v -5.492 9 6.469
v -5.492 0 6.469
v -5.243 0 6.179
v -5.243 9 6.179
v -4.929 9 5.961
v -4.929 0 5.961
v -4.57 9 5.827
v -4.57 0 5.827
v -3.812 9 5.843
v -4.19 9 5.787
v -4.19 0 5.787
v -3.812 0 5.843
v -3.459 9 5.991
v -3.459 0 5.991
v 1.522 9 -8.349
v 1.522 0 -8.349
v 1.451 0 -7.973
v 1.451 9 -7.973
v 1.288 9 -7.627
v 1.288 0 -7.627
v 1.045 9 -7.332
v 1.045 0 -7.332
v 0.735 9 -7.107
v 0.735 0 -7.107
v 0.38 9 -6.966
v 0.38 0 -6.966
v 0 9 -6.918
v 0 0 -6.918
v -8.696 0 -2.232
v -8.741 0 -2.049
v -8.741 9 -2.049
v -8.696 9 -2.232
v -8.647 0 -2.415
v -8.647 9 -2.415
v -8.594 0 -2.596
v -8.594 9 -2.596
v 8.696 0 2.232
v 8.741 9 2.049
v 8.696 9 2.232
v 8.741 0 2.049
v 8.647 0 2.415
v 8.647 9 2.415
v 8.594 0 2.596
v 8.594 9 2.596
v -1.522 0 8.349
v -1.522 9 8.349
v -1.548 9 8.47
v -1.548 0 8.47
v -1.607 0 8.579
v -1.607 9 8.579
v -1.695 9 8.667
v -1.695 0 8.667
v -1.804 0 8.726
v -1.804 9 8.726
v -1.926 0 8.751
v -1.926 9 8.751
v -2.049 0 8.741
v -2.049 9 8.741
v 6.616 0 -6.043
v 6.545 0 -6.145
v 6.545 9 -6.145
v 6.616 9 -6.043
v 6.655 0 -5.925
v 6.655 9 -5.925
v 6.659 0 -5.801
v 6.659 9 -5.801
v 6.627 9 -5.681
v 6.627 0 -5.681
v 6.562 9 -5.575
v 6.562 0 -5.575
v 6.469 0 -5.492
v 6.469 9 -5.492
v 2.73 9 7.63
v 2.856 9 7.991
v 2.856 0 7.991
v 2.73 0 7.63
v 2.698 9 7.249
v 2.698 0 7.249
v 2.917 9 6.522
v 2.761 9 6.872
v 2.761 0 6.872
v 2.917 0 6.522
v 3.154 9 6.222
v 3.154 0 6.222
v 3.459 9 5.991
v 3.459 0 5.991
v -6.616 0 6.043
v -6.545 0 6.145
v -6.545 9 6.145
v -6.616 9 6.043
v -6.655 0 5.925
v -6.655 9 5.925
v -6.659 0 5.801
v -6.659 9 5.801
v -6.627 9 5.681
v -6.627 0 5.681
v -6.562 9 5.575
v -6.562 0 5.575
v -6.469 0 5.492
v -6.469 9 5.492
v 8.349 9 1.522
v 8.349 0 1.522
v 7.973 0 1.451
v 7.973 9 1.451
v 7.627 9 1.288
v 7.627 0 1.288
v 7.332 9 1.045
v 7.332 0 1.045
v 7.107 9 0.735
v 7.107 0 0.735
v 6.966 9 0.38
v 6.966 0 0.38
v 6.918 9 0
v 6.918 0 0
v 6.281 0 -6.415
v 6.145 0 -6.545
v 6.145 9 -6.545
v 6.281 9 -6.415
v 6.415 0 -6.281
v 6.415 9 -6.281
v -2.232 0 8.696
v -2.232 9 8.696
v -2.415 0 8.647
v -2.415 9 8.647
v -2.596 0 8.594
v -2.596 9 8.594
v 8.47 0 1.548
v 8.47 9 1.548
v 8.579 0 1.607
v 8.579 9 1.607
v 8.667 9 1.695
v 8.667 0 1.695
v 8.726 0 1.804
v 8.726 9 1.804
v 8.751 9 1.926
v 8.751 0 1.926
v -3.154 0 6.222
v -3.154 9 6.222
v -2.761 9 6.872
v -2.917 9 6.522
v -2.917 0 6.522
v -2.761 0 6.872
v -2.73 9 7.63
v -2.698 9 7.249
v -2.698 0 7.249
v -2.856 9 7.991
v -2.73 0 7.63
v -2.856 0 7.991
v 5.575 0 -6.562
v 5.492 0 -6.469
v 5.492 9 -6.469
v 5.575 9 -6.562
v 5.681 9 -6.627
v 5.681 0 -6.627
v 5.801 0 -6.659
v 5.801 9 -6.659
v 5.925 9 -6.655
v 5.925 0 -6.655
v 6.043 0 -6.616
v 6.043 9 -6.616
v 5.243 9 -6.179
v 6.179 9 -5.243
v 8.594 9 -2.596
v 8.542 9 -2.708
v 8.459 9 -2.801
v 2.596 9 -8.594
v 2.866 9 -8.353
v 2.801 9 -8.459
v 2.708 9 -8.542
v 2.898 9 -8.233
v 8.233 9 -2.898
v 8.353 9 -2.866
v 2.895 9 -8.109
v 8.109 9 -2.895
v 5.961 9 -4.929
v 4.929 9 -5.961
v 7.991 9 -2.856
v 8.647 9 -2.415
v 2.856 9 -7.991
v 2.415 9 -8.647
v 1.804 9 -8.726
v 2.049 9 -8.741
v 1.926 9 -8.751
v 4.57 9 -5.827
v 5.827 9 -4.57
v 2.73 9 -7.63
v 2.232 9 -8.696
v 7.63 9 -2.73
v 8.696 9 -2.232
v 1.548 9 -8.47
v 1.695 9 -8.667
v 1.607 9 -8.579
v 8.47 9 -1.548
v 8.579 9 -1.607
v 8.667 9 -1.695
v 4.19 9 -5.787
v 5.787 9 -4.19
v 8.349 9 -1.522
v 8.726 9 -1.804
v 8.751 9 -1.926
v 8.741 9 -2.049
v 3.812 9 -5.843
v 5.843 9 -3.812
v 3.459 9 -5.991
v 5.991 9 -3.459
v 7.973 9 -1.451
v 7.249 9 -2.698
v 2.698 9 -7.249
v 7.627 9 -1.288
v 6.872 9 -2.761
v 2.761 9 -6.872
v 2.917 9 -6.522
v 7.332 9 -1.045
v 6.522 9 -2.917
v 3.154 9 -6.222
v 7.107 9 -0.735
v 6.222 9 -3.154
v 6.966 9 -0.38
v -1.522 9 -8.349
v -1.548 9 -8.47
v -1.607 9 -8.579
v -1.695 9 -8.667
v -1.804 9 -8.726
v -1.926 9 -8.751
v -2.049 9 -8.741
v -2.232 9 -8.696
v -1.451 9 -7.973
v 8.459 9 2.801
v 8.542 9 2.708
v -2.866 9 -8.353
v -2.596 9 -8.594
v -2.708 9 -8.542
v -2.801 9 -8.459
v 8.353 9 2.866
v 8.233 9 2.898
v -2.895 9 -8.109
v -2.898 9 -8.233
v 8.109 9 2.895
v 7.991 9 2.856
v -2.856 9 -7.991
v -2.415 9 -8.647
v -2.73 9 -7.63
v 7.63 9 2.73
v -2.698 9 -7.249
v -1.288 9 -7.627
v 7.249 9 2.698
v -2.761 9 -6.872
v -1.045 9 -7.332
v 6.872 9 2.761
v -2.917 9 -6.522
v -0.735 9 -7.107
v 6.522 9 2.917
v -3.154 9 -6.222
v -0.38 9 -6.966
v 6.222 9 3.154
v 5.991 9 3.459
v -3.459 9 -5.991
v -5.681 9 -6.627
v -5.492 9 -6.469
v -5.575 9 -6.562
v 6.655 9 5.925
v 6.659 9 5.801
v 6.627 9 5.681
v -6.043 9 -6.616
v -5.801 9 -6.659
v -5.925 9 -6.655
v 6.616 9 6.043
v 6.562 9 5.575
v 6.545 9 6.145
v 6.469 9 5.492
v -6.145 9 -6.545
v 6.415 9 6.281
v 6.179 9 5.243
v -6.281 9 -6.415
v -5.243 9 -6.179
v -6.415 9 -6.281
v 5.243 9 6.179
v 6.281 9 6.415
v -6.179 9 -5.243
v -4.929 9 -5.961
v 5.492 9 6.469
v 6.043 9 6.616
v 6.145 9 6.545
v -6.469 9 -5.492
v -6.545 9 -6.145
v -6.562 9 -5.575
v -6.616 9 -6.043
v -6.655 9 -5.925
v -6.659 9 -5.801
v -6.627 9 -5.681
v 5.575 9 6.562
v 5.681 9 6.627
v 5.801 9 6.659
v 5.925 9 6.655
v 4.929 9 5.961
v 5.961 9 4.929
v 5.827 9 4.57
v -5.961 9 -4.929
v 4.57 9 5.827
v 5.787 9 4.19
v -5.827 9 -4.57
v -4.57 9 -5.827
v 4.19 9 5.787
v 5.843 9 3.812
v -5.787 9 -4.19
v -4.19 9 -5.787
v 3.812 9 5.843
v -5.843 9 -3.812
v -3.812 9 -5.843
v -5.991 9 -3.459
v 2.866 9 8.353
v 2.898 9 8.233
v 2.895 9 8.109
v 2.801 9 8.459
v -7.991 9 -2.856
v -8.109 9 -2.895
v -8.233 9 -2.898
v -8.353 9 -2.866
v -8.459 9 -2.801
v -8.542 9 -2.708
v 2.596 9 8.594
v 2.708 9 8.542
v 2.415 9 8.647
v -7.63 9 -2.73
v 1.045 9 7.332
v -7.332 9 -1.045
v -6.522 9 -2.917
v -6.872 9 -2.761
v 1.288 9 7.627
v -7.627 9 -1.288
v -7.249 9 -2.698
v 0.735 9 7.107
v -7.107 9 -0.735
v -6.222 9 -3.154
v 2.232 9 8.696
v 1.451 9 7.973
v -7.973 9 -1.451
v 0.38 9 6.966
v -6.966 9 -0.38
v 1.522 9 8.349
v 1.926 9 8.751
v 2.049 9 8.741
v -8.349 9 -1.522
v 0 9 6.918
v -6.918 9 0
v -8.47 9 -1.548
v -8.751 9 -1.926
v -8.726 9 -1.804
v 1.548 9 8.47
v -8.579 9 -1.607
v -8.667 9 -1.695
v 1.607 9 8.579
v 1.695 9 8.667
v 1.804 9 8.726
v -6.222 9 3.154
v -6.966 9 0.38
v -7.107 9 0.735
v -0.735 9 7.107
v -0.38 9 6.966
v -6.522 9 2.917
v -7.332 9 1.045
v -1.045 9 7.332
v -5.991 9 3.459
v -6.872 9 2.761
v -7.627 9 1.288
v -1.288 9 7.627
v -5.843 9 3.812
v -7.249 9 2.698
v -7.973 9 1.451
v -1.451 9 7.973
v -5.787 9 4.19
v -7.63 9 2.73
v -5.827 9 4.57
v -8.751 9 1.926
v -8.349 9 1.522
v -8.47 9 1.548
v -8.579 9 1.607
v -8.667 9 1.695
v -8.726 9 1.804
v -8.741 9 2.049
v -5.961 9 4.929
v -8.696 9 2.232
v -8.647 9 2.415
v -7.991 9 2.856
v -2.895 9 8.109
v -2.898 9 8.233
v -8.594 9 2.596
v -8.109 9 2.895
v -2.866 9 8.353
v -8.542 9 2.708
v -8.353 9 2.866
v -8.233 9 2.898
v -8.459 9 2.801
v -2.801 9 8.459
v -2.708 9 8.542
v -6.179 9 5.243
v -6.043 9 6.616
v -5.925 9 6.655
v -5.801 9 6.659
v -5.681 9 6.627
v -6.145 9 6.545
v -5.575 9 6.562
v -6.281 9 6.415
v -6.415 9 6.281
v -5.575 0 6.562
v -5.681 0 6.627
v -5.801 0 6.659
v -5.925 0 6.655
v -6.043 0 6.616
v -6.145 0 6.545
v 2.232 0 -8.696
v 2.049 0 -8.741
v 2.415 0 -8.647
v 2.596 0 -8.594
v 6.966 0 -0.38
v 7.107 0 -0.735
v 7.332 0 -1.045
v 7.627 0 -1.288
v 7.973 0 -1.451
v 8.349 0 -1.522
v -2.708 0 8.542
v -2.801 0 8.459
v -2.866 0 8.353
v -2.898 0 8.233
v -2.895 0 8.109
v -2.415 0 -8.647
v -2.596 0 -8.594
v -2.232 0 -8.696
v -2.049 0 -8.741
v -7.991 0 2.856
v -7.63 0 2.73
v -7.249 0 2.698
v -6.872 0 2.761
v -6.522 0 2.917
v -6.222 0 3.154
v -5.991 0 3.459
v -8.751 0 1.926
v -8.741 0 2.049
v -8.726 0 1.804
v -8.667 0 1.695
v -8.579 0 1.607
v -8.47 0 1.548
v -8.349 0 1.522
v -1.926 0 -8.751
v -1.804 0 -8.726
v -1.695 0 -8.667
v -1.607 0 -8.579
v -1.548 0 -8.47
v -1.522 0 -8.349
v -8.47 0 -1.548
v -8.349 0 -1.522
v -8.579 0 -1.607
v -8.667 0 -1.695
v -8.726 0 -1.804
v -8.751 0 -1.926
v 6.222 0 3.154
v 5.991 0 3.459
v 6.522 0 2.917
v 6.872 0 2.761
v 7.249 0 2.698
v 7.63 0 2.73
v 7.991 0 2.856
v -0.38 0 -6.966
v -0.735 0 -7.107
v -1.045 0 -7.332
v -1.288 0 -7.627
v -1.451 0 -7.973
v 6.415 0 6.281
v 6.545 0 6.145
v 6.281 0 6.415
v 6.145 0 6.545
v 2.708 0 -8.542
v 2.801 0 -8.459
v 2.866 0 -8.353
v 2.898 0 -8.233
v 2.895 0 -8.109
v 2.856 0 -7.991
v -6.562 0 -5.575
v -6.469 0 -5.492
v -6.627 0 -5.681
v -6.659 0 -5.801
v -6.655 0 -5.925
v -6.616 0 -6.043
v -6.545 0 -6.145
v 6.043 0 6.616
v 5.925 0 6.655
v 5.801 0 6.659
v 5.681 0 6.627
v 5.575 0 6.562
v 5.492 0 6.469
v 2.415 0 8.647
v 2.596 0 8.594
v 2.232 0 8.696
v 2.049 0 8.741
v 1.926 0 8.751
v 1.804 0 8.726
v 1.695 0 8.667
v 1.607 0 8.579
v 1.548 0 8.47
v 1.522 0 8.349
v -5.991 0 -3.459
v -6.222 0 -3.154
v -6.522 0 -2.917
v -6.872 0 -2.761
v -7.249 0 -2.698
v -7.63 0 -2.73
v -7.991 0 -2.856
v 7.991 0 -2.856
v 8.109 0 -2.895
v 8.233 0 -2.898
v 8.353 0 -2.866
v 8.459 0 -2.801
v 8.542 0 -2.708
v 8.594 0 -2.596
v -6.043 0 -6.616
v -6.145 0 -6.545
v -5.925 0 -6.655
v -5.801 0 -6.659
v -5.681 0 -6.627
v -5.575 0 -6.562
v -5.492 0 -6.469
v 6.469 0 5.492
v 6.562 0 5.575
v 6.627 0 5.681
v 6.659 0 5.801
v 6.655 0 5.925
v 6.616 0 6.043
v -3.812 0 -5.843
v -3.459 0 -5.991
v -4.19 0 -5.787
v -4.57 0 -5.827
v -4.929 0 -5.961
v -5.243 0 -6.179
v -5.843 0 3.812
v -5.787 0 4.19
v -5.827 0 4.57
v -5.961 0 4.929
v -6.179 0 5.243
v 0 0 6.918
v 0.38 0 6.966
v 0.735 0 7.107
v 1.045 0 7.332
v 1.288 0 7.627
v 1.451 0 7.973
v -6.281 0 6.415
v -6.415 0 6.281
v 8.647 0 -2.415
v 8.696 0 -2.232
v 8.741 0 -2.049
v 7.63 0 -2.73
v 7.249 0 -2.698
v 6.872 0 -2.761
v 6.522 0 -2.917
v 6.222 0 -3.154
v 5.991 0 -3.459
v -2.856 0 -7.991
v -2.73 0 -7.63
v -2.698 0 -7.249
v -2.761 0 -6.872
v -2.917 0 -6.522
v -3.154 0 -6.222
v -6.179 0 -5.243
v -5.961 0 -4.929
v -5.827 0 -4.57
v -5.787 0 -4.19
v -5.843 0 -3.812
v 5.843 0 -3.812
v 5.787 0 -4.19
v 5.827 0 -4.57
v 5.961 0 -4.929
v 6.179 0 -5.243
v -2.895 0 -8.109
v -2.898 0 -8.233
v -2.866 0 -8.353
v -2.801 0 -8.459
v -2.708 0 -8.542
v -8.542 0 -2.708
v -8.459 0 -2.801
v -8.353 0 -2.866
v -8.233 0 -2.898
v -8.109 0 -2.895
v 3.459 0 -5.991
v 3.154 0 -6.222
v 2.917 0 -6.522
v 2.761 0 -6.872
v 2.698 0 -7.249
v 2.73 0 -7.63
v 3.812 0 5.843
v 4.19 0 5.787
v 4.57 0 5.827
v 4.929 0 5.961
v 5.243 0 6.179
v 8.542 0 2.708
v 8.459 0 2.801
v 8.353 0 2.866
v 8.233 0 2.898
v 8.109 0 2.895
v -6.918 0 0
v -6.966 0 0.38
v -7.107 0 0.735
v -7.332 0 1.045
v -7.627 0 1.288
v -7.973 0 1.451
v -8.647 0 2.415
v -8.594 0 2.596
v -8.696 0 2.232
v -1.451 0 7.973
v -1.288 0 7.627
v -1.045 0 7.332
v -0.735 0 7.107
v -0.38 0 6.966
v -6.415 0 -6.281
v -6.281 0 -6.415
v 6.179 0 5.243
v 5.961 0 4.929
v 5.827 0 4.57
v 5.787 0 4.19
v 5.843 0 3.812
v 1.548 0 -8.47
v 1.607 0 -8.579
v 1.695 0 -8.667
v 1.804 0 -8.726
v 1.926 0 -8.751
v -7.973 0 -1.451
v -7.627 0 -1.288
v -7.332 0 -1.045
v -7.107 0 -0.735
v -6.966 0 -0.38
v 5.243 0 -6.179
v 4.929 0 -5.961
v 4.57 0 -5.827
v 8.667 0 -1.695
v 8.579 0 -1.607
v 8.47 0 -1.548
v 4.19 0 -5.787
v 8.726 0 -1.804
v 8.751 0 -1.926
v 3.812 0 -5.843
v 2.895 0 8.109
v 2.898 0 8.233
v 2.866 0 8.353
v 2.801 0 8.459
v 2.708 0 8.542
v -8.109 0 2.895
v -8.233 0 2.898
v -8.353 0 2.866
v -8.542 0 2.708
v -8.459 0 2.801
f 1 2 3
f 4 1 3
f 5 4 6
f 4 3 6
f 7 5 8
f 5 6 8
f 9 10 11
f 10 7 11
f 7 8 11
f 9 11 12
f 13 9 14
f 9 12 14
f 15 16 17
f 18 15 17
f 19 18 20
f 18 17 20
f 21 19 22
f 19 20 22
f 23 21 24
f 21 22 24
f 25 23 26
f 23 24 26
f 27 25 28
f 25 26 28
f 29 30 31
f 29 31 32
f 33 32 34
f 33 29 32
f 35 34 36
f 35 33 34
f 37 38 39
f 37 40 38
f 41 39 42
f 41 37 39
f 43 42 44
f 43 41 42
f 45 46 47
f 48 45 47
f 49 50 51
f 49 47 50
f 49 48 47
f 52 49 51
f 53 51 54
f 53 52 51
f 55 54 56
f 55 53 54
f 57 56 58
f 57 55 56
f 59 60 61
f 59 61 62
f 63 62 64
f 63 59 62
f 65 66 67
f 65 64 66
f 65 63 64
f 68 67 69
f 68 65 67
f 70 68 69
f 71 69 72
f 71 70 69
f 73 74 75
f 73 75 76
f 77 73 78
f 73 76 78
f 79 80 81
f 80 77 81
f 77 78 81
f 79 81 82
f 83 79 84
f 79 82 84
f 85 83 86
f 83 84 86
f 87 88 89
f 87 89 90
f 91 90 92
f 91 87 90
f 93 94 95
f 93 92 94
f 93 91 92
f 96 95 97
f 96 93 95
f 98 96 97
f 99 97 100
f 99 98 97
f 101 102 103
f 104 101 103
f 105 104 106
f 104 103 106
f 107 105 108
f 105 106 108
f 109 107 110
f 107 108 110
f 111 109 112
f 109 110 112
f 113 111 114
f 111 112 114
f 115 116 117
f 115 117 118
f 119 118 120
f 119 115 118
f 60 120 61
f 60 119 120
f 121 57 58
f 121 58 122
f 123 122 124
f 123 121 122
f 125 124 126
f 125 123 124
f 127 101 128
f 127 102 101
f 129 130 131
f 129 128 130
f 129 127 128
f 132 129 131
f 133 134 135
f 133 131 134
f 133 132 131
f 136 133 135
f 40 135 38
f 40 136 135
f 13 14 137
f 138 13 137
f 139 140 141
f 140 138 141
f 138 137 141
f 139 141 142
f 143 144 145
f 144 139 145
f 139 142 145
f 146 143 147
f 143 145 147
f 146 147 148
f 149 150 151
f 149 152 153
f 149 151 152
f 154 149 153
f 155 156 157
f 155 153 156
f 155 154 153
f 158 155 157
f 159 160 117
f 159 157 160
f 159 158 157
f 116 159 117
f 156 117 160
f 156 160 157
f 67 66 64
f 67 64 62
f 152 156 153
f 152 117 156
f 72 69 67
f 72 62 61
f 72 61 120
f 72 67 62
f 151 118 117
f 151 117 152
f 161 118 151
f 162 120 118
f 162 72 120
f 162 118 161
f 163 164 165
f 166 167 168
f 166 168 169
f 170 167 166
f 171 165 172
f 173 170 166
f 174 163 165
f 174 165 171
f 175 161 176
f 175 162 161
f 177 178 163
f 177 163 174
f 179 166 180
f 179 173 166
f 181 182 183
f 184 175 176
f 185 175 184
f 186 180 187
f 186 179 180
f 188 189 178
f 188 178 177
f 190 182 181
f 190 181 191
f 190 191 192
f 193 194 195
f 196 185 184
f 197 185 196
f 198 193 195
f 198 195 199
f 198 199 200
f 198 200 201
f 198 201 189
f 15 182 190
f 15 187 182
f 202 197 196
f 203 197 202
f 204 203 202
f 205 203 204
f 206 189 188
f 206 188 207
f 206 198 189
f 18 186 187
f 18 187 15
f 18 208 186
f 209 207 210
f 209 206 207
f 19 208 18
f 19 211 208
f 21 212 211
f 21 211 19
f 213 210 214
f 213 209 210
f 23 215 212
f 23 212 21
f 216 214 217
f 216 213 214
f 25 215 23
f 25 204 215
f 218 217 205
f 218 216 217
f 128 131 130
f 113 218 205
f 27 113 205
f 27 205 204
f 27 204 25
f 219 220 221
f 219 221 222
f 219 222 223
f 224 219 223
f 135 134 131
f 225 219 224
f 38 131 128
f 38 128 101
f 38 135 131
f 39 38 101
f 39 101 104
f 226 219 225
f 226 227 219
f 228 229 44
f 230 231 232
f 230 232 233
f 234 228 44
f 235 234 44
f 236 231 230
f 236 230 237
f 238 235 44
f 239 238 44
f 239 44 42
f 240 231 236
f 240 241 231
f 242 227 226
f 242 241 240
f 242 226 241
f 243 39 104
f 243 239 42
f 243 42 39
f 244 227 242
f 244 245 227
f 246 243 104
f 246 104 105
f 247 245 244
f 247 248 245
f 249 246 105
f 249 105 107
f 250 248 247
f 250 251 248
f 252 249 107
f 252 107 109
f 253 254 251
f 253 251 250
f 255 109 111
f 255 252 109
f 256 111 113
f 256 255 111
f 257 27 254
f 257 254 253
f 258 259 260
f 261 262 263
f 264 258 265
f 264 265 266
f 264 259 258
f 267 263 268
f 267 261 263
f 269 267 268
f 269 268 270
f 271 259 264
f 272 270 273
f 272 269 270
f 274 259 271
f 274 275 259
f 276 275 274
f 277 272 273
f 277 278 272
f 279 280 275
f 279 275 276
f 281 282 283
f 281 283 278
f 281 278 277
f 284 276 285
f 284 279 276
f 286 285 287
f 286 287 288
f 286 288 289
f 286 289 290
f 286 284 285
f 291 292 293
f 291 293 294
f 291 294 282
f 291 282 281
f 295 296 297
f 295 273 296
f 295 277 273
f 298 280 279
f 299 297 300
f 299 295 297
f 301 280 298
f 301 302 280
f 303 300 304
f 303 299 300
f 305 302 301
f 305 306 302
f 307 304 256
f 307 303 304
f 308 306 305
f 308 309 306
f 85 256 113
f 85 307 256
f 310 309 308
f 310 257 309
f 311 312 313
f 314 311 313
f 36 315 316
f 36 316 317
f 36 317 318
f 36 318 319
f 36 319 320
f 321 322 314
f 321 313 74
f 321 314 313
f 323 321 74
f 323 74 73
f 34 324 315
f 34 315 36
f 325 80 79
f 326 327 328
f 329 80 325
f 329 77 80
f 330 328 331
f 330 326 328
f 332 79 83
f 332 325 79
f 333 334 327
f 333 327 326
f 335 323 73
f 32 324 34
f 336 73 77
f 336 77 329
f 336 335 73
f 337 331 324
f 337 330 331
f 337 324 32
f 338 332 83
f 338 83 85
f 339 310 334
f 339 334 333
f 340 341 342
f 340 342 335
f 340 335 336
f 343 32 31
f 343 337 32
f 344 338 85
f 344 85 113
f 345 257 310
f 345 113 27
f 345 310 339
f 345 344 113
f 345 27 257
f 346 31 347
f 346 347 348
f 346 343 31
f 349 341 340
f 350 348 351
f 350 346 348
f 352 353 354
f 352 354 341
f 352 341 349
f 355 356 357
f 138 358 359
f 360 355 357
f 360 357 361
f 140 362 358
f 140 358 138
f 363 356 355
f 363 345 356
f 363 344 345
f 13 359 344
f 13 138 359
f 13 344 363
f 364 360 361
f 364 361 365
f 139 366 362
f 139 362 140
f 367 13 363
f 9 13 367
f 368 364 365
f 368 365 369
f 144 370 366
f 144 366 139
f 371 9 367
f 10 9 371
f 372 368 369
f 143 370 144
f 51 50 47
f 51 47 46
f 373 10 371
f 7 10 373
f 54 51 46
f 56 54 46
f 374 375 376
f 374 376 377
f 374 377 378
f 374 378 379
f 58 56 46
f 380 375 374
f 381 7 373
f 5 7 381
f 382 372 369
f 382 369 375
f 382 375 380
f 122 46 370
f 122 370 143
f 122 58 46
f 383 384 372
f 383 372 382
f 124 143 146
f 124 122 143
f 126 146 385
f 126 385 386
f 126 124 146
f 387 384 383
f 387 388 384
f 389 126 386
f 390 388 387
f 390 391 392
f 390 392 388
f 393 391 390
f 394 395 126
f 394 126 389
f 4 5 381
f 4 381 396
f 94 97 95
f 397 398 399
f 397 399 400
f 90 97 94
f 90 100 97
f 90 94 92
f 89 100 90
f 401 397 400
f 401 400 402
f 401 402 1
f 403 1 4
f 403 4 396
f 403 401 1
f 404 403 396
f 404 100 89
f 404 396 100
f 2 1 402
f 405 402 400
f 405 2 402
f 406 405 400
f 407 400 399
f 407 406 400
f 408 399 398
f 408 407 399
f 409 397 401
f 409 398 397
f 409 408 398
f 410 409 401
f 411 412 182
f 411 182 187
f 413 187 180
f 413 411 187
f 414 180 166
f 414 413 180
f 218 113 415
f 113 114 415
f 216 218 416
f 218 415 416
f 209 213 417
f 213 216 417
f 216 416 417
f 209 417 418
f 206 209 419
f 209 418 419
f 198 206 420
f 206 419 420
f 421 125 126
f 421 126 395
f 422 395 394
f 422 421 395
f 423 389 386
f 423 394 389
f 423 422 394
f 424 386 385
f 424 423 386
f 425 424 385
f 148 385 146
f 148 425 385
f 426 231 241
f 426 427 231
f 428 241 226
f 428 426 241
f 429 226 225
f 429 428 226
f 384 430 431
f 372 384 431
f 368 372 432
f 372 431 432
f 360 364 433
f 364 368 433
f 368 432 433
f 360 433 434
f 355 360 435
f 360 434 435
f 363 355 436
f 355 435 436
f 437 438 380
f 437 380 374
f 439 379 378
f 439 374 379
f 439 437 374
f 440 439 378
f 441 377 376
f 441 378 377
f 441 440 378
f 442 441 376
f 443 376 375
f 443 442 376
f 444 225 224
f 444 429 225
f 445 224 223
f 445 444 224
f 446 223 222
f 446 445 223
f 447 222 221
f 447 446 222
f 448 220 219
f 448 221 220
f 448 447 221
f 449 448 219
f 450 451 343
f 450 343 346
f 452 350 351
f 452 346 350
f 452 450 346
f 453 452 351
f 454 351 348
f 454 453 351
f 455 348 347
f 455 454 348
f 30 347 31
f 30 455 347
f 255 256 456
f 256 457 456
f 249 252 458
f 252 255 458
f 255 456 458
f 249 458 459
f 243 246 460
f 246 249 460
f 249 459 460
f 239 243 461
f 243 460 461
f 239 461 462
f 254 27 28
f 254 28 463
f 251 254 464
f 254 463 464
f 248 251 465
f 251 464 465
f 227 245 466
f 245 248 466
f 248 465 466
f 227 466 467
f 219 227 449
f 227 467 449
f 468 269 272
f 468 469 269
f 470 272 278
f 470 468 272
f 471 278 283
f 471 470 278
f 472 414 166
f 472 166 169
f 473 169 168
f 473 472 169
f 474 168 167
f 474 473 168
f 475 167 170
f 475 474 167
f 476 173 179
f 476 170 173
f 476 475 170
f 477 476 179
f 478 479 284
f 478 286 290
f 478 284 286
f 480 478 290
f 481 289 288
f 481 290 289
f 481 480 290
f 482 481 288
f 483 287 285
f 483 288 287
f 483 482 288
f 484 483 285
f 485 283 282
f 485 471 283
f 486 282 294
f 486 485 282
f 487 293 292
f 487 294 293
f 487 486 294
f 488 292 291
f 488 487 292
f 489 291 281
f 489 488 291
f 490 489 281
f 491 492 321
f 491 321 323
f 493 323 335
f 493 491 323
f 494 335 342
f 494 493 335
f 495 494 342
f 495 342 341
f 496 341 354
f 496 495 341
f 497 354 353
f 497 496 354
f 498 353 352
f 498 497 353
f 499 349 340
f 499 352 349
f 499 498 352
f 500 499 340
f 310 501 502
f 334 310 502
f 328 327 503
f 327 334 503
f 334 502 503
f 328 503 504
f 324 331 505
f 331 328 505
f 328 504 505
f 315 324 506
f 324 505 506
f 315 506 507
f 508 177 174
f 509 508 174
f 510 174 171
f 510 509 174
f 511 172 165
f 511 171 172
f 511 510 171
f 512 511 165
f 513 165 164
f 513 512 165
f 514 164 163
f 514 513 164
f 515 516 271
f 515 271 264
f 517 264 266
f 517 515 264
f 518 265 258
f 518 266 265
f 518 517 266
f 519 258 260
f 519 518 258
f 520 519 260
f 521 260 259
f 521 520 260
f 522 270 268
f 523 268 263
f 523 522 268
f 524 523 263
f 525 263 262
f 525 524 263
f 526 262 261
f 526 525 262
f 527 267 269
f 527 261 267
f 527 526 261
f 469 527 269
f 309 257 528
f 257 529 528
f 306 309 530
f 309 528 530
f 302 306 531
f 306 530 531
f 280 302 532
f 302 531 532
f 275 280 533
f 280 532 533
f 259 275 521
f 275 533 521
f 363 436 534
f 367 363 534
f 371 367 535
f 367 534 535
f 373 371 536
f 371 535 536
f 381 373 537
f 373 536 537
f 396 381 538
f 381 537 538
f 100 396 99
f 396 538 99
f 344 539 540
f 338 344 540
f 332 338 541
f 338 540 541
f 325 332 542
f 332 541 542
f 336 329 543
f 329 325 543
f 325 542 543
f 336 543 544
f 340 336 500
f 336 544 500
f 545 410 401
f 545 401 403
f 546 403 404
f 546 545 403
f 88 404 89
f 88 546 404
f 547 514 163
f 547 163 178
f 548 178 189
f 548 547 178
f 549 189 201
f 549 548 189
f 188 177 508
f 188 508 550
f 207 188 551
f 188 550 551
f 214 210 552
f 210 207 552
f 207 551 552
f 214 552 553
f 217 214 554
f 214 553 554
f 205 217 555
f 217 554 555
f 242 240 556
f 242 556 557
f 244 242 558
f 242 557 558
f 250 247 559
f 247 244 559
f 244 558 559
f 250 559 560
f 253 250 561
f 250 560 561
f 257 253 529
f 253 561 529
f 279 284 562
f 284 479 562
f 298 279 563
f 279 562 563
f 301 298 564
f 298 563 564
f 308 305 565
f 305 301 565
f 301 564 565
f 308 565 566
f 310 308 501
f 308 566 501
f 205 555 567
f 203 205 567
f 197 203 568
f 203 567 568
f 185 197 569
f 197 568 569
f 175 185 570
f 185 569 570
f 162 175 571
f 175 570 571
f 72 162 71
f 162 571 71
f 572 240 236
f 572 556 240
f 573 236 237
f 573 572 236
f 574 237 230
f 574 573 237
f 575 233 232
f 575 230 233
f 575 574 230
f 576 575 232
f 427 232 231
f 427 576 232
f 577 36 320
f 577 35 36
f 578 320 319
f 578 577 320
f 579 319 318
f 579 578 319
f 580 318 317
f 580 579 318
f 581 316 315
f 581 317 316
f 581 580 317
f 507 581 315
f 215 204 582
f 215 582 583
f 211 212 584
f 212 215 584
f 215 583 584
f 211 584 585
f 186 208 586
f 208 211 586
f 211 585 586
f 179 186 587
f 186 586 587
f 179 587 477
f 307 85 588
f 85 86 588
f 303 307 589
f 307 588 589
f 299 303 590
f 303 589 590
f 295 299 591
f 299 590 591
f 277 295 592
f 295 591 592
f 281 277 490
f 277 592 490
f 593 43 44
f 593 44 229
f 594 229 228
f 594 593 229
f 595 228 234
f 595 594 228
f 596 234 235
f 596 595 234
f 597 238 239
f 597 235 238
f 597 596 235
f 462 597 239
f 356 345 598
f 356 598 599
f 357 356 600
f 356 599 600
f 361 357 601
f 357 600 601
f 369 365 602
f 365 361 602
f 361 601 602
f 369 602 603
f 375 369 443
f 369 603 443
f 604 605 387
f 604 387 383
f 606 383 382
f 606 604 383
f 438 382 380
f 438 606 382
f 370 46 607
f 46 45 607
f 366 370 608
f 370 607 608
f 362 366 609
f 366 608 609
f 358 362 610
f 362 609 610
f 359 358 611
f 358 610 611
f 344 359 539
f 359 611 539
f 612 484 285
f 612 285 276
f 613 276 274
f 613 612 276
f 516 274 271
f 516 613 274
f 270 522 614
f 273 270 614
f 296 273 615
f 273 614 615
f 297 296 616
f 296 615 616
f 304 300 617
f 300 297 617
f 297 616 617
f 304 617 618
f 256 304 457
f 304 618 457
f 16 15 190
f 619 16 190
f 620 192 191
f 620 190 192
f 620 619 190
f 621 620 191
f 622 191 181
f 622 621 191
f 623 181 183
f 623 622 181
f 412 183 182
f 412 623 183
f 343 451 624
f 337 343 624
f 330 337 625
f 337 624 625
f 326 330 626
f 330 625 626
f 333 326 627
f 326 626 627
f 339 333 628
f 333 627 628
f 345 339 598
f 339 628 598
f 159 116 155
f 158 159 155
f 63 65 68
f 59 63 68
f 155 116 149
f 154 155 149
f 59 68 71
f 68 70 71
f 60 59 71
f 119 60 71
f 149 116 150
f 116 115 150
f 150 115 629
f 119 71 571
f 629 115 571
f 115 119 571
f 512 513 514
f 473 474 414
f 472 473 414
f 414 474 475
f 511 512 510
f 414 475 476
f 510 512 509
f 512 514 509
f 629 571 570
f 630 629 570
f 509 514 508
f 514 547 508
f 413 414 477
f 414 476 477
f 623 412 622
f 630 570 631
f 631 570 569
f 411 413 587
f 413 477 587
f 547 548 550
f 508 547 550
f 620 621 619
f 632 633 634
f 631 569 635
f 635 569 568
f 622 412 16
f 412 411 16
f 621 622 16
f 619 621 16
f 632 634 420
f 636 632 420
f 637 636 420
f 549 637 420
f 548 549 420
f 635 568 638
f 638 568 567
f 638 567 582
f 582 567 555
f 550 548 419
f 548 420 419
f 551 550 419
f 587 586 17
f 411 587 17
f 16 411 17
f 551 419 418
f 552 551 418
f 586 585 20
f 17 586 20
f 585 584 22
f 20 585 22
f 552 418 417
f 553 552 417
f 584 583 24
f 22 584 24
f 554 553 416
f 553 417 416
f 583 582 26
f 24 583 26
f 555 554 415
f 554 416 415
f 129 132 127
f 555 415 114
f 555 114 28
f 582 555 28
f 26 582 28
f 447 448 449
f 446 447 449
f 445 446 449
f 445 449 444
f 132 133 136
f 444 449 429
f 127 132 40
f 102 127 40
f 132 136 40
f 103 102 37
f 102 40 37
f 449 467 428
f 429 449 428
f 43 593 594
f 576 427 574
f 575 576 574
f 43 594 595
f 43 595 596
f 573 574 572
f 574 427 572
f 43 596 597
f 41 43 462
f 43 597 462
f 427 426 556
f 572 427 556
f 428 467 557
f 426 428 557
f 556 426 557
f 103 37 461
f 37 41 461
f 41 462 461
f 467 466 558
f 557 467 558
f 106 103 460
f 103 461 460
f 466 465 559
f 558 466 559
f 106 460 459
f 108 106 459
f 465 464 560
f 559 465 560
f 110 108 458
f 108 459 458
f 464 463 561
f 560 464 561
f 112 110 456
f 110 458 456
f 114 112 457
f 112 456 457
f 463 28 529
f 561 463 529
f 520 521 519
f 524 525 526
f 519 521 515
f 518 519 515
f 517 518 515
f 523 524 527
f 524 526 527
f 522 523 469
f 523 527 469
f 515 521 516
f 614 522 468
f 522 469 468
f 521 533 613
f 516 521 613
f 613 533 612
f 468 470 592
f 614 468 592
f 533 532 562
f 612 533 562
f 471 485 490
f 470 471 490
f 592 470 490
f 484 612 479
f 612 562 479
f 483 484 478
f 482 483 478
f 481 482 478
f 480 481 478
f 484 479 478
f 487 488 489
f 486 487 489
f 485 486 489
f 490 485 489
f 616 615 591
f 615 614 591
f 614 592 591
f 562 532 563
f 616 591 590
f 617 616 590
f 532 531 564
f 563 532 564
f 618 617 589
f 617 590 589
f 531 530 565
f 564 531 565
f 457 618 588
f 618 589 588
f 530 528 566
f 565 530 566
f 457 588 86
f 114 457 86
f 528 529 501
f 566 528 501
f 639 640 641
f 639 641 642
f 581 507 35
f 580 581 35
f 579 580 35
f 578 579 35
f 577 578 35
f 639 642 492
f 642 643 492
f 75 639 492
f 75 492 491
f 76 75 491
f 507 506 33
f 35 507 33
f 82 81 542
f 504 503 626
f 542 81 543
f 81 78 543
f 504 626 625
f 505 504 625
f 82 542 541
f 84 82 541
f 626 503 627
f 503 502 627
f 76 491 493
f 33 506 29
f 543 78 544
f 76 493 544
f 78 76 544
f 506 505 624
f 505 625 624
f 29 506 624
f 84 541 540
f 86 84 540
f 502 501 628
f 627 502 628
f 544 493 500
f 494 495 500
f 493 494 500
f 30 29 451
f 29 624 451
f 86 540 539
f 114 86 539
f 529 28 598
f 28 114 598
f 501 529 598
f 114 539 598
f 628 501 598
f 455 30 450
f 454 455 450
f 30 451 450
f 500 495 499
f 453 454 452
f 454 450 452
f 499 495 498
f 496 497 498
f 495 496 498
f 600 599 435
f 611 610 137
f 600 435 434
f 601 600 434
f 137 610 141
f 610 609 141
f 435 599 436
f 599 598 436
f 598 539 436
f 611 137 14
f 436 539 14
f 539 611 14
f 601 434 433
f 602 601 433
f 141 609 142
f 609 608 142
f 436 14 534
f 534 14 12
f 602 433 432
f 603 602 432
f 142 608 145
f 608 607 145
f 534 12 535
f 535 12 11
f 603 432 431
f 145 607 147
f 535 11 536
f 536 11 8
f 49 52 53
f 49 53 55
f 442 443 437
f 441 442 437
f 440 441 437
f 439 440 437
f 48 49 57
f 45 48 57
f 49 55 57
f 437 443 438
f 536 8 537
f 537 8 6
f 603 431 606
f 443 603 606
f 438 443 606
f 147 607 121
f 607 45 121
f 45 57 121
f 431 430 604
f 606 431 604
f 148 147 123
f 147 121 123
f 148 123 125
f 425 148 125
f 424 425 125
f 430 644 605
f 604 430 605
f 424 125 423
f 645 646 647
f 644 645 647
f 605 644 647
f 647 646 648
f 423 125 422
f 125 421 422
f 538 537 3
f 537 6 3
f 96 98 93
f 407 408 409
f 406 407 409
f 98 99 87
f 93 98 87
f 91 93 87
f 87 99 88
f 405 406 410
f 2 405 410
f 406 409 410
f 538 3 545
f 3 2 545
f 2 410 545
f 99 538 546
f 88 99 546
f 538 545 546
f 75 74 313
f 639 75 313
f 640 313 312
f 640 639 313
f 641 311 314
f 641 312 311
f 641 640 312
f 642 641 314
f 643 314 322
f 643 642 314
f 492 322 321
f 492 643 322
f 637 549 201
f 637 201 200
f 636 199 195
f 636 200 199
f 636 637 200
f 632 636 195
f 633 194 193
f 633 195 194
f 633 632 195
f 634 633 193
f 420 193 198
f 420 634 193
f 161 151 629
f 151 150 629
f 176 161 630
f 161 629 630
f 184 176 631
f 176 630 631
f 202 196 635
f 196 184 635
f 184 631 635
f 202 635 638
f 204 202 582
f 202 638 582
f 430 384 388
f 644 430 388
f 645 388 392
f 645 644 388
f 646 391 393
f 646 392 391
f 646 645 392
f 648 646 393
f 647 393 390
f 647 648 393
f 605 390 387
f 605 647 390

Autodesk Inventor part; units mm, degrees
ref_plane "YZ Plane" through (0, 0, 0) normal (1, 0, 0) x (0, 1, 0)
ref_plane "XZ Plane" through (0, 0, 0) normal (0, 1, 0) x (-1, 0, 0)
ref_plane "XY Plane" through (0, 0, 0) normal (0, 0, 1) x (1, 0, 0)
sketch "Sketch2" plane through (0, 0, 0) normal (0, 1, 0) x (-1, 0, 0)
  circle A0 centre (0, 0) radius 8.9778 construction
  circle A1 centre (0, 0) radius 6.9178 construction
  arc A2 (0, -6.9178) -> (-1.5221, -8.3486) centre (0, -8.4428) ccw
  line L0 (0, 0) -> (0, -8.9778) construction
  line L1 (0, 0) -> (-2.3236, -8.6719) construction
  arc A3 (-2.0494, -8.7407) -> (-1.5221, -8.3486) centre (-1.9513, -8.3221) ccw
  arc A4 (-2.8562, -7.9912) -> (-3.4589, -5.991) centre (-4.2214, -7.3117) ccw
  arc A5 (-2.8562, -7.9912) -> (-2.5955, -8.5944) centre (-2.4712, -8.1828) ccw
  arc A6 (-2.5955, -8.5944) -> (-2.0494, -8.7407) centre (0, 0) ccw
  arc A7 (2.5955, -8.5944) -> (2.8562, -7.9912) centre (2.4712, -8.1828) ccw
  arc A8 (1.5221, -8.3486) -> (0, -6.9178) centre (0, -8.4428) ccw
  arc A9 (1.5221, -8.3486) -> (2.0494, -8.7407) centre (1.9513, -8.3221) ccw
  arc A10 (2.0494, -8.7407) -> (2.5955, -8.5944) centre (0, 0) ccw
  arc A11 (3.4589, -5.991) -> (2.8562, -7.9912) centre (4.2214, -7.3117) ccw
  arc A12 (6.545, -6.1452) -> (6.4691, -5.4925) centre (6.2315, -5.8509) ccw
  arc A13 (5.4925, -6.4691) -> (3.4589, -5.991) centre (4.2214, -7.3117) ccw
  arc A14 (5.4925, -6.4691) -> (6.1452, -6.545) centre (5.8509, -6.2315) ccw
  arc A15 (6.1452, -6.545) -> (6.545, -6.1452) centre (0, 0) ccw
  arc A16 (5.991, -3.4589) -> (6.4691, -5.4925) centre (7.3117, -4.2214) ccw
  arc A17 (8.7407, -2.0494) -> (8.3486, -1.5221) centre (8.3221, -1.9513) ccw
  arc A18 (7.9912, -2.8562) -> (5.991, -3.4589) centre (7.3117, -4.2214) ccw
  arc A19 (7.9912, -2.8562) -> (8.5944, -2.5955) centre (8.1828, -2.4712) ccw
  arc A20 (8.5944, -2.5955) -> (8.7407, -2.0494) centre (0, 0) ccw
  arc A21 (6.9178, 0) -> (8.3486, -1.5221) centre (8.4428, 0) ccw
  arc A22 (8.5944, 2.5955) -> (7.9912, 2.8562) centre (8.1828, 2.4712) ccw
  arc A23 (8.3486, 1.5221) -> (6.9178, 0) centre (8.4428, 0) ccw
  arc A24 (8.3486, 1.5221) -> (8.7407, 2.0494) centre (8.3221, 1.9513) ccw
  arc A25 (8.7407, 2.0494) -> (8.5944, 2.5955) centre (0, 0) ccw
  arc A26 (5.991, 3.4589) -> (7.9912, 2.8562) centre (7.3117, 4.2214) ccw
  arc A27 (6.1452, 6.545) -> (5.4925, 6.4691) centre (5.8509, 6.2315) ccw
  arc A28 (6.4691, 5.4925) -> (5.991, 3.4589) centre (7.3117, 4.2214) ccw
  arc A29 (6.4691, 5.4925) -> (6.545, 6.1452) centre (6.2315, 5.8509) ccw
  arc A30 (6.545, 6.1452) -> (6.1452, 6.545) centre (0, 0) ccw
  arc A31 (3.4589, 5.991) -> (5.4925, 6.4691) centre (4.2214, 7.3117) ccw
  arc A32 (2.0494, 8.7407) -> (1.5221, 8.3486) centre (1.9513, 8.3221) ccw
  arc A33 (2.8562, 7.9912) -> (3.4589, 5.991) centre (4.2214, 7.3117) ccw
  arc A34 (2.8562, 7.9912) -> (2.5955, 8.5944) centre (2.4712, 8.1828) ccw
  arc A35 (2.5955, 8.5944) -> (2.0494, 8.7407) centre (0, 0) ccw
  arc A36 (0, 6.9178) -> (1.5221, 8.3486) centre (0, 8.4428) ccw
  arc A37 (-2.5955, 8.5944) -> (-2.8562, 7.9912) centre (-2.4712, 8.1828) ccw
  arc A38 (-1.5221, 8.3486) -> (0, 6.9178) centre (0, 8.4428) ccw
  arc A39 (-1.5221, 8.3486) -> (-2.0494, 8.7407) centre (-1.9513, 8.3221) ccw
  arc A40 (-2.0494, 8.7407) -> (-2.5955, 8.5944) centre (0, 0) ccw
  arc A41 (-3.4589, 5.991) -> (-2.8562, 7.9912) centre (-4.2214, 7.3117) ccw
  arc A42 (-6.545, 6.1452) -> (-6.4691, 5.4925) centre (-6.2315, 5.8509) ccw
  arc A43 (-5.4925, 6.4691) -> (-3.4589, 5.991) centre (-4.2214, 7.3117) ccw
  arc A44 (-5.4925, 6.4691) -> (-6.1452, 6.545) centre (-5.8509, 6.2315) ccw
  arc A45 (-6.1452, 6.545) -> (-6.545, 6.1452) centre (0, 0) ccw
  arc A46 (-5.991, 3.4589) -> (-6.4691, 5.4925) centre (-7.3117, 4.2214) ccw
  arc A47 (-8.7407, 2.0494) -> (-8.3486, 1.5221) centre (-8.3221, 1.9513) ccw
  arc A48 (-7.9912, 2.8562) -> (-5.991, 3.4589) centre (-7.3117, 4.2214) ccw
  arc A49 (-7.9912, 2.8562) -> (-8.5944, 2.5955) centre (-8.1828, 2.4712) ccw
  arc A50 (-8.5944, 2.5955) -> (-8.7407, 2.0494) centre (0, 0) ccw
  arc A51 (-6.9178, 0) -> (-8.3486, 1.5221) centre (-8.4428, 0) ccw
  arc A52 (-8.5944, -2.5955) -> (-7.9912, -2.8562) centre (-8.1828, -2.4712) ccw
  arc A53 (-8.3486, -1.5221) -> (-6.9178, 0) centre (-8.4428, 0) ccw
  arc A54 (-8.3486, -1.5221) -> (-8.7407, -2.0494) centre (-8.3221, -1.9513) ccw
  arc A55 (-8.7407, -2.0494) -> (-8.5944, -2.5955) centre (0, 0) ccw
  arc A56 (-5.991, -3.4589) -> (-7.9912, -2.8562) centre (-7.3117, -4.2214) ccw
  arc A57 (-6.1452, -6.545) -> (-5.4925, -6.4691) centre (-5.8509, -6.2315) ccw
  arc A58 (-6.4691, -5.4925) -> (-5.991, -3.4589) centre (-7.3117, -4.2214) ccw
  arc A59 (-6.4691, -5.4925) -> (-6.545, -6.1452) centre (-6.2315, -5.8509) ccw
  arc A60 (-6.545, -6.1452) -> (-6.1452, -6.545) centre (0, 0) ccw
  arc A61 (-3.4589, -5.991) -> (-5.4925, -6.4691) centre (-4.2214, -7.3117) ccw
  point P0 (2.3236, -8.6719)
  point P1 (6.3483, -6.3483)
  point P2 (8.6719, -2.3236)
  point P3 (8.6719, 2.3236)
  point P4 (6.3483, 6.3483)
  point P5 (2.3236, 8.6719)
  point P6 (-2.3236, 8.6719)
  point P7 (-6.3483, 6.3483)
  point P8 (-8.6719, 2.3236)
  point P9 (3.4589, -5.991)
  point P10 (6.9178, 0)
  point P11 (5.991, 3.4589)
  point P12 (3.4589, 5.991)
  point P13 (0, 6.9178)
  point P14 (-5.991, 3.4589)
  point P15 (-3.1307, -4.309)
  point P16 (0, -6.9178)
  point P17 (-8.6719, -2.3236)
  point P18 (-6.3483, -6.3483)
  dimension "d1" = 13.8356
  dimension "d2" = 17.9556
  dimension "d3" = 15
  dimension "d4" = 3.05
  dimension "d5" = 0.86
  dimension "d8" = 360
extrude "Extrusion1" add sketch "Sketch2" along normal blind 9
properties part number "5mm_HTD_Pully"
